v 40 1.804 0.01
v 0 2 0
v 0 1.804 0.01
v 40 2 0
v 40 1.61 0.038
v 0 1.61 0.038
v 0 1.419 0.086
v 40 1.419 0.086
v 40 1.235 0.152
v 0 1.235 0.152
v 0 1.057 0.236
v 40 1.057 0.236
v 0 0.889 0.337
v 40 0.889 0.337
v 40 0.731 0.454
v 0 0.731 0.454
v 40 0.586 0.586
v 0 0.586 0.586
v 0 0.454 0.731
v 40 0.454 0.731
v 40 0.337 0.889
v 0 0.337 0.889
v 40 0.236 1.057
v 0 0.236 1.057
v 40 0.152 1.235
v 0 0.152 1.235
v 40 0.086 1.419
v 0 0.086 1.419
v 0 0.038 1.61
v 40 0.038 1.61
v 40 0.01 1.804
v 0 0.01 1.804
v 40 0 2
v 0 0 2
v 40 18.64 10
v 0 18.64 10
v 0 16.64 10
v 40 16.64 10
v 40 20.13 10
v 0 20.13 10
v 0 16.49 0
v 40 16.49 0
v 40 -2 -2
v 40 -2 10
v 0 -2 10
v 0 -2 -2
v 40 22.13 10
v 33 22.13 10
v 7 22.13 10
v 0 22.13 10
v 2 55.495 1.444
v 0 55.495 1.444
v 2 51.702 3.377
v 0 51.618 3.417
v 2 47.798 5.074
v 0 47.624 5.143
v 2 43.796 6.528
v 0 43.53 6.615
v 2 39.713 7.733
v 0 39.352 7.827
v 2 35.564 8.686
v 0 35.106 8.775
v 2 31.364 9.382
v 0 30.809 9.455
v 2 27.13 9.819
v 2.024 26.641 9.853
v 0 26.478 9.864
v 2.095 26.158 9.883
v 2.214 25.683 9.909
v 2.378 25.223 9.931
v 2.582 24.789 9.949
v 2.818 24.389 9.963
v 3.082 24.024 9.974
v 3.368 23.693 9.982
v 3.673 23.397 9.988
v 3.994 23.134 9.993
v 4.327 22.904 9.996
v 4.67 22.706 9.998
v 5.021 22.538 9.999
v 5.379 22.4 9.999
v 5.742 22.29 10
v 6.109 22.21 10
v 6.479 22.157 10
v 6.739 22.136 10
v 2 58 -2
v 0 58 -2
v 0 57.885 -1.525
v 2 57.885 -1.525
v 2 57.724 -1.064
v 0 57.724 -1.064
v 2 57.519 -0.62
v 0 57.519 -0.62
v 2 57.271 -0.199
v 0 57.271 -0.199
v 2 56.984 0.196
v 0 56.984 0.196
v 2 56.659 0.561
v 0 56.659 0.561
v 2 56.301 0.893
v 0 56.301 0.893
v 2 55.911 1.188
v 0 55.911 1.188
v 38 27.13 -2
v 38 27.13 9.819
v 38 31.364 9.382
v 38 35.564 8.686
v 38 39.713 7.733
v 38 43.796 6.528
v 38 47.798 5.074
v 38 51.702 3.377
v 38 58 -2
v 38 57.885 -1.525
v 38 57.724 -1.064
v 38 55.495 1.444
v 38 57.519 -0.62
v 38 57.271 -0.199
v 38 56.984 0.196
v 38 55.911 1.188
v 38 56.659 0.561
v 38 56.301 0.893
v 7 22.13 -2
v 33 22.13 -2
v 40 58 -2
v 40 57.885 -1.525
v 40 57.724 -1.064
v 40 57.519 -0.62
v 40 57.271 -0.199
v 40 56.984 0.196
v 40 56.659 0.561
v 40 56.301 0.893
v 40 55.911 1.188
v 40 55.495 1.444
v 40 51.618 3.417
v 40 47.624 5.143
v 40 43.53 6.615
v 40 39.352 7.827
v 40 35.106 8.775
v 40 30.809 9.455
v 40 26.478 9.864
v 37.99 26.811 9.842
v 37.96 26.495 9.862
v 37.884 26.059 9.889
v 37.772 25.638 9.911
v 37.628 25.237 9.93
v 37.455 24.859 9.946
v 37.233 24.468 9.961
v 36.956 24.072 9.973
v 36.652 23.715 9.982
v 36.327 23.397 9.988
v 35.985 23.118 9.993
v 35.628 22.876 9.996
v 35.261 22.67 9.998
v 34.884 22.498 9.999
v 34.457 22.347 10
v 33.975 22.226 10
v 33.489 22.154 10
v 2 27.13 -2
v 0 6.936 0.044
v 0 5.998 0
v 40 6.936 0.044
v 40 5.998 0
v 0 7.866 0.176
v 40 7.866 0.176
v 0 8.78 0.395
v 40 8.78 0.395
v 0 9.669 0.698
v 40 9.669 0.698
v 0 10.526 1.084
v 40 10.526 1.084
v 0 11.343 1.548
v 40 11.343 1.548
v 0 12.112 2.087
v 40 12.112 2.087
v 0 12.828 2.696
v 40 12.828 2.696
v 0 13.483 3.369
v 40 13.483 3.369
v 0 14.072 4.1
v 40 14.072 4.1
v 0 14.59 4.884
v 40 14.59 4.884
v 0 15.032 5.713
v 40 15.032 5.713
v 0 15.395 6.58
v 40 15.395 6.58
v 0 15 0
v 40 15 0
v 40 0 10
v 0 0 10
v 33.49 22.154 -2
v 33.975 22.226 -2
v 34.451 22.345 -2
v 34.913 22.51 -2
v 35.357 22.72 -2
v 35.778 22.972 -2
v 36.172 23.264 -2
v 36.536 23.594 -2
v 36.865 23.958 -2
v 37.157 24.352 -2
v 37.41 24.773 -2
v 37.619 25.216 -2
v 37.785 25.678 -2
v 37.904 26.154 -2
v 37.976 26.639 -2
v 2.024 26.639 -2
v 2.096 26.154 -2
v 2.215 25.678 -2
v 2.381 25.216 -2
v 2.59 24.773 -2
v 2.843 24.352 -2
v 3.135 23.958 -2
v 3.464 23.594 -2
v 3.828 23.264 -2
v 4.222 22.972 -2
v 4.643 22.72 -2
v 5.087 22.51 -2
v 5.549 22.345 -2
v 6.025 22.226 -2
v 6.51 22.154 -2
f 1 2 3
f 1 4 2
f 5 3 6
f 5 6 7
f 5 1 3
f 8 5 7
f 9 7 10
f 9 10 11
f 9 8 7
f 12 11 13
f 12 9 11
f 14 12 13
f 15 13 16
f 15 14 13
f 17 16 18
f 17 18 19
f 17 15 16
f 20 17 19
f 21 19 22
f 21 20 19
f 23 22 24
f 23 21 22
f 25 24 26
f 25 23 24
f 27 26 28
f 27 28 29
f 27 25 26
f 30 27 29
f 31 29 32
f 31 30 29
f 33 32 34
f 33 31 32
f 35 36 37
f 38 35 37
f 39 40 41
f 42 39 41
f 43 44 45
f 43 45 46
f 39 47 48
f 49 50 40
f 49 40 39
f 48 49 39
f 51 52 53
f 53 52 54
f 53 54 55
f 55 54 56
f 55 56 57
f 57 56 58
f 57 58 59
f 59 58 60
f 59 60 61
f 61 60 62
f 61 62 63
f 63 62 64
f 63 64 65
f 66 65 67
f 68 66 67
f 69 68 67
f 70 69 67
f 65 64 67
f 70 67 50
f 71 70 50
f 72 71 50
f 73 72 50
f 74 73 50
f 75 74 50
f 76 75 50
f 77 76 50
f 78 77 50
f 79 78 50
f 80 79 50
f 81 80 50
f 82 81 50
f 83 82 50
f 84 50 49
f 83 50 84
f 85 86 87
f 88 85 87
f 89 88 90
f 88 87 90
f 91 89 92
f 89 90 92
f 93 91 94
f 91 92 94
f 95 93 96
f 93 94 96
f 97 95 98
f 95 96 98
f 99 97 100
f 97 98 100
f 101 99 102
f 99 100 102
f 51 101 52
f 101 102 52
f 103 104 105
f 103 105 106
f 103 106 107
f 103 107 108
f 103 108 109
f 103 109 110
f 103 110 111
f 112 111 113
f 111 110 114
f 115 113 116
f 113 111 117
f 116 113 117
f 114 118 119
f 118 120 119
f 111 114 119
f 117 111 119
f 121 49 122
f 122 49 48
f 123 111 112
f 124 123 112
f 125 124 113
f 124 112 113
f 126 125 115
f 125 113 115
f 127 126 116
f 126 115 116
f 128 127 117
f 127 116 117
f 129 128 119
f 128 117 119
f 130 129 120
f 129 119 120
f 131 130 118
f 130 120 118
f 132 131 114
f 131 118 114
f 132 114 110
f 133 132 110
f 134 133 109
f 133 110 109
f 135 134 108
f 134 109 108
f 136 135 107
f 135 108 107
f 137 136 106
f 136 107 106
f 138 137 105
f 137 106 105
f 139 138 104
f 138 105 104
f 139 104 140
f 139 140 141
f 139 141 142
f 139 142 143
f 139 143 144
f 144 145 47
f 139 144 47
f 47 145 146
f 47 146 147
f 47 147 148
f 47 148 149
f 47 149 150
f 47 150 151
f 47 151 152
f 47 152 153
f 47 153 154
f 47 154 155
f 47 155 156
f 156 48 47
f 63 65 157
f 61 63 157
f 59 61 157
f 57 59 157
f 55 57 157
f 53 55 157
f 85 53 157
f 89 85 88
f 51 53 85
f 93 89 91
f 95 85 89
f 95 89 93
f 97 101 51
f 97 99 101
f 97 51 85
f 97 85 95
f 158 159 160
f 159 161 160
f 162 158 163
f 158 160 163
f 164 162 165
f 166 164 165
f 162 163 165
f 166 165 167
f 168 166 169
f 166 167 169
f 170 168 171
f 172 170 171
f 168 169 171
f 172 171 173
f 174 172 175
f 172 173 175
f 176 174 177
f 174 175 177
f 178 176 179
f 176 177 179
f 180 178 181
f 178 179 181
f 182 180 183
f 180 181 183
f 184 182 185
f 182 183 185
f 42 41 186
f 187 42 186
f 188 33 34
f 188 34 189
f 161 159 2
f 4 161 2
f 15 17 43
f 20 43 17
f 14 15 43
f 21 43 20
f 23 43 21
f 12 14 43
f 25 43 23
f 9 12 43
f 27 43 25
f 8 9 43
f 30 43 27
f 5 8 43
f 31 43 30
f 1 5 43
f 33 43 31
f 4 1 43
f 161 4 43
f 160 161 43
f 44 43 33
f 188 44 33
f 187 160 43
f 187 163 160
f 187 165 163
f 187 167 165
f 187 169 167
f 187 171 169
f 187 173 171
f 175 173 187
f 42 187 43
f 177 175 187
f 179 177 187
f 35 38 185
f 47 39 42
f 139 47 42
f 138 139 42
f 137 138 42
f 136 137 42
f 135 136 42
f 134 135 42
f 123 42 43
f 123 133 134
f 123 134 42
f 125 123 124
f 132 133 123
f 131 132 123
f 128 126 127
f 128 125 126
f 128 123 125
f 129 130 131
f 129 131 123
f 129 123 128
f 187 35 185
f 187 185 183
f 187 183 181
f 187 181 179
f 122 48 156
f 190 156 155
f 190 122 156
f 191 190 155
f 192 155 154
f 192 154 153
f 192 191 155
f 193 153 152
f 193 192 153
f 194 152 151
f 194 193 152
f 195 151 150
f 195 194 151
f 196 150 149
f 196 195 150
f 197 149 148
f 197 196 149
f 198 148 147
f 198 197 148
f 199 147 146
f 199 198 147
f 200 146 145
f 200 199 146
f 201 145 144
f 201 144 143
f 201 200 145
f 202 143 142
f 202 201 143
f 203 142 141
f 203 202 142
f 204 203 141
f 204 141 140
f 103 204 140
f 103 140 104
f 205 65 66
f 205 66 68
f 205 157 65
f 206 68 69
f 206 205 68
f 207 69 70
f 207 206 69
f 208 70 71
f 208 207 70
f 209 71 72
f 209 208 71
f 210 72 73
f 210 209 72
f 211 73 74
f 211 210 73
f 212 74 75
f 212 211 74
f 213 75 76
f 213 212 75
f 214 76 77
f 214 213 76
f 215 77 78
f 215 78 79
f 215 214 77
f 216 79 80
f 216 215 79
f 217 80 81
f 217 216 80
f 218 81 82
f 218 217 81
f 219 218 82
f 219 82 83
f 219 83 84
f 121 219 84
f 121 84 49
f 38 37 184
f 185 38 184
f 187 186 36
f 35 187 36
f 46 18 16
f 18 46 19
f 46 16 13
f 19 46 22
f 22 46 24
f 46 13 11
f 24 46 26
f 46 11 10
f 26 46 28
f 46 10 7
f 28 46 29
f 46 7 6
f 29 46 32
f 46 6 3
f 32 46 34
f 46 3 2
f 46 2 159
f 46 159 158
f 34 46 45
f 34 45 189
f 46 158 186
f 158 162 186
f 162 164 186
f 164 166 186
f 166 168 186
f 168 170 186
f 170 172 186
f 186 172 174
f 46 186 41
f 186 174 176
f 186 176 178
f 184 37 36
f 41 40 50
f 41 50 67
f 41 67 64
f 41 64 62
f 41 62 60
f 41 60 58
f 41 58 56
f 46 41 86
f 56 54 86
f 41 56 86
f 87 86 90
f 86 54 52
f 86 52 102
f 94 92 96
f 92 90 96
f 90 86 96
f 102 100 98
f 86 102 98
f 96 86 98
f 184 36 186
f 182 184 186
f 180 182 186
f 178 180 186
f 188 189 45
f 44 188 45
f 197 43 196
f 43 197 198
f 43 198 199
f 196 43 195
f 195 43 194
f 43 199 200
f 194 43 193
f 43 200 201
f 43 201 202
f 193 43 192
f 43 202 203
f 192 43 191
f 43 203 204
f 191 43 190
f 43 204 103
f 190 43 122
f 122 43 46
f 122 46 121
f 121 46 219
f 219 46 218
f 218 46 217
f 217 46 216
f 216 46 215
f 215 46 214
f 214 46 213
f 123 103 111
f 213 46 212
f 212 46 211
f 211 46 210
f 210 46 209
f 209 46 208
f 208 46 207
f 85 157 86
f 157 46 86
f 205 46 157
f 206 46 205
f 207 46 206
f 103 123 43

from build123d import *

# Parameters (mm, degrees)
F1_DEPTH    = 40
F2_R        = 10
F3_R        = 2
F4_W        = 36
F4_H        = 35.8704487759
F5_DEPTH    = 25
F6_R        = 5
F7_T1_DEPTH = 16.4561700335
F7_T3_DEPTH = 16.4561700335


# Not quite as in the source:
# - a fillet or chamfer that OpenCascade refuses, or shapes differently, is made with other operations: its cross-section is extruded or revolved along the edge and cut away or added


with BuildPart() as f1:
    # F0 (on Right) → F1 (new body)
    with BuildSketch(Plane.YZ):
        Polygon((13, 0), (0, 0), (0, 10), (-2, 10), (-2, -2), (58, -2), (58, 0), (22.1295512241, 0), (22.1295512241, 10), (20.1295512241, 10), (16.4898488815, 0), (15, 0), (18.6397023427, 10), (16.6397023427, 10), align=None)
        with BuildLine():
            Line((22.1295512241, 0), (58, 0))
            ThreePointArc((58, 0), (40.7486885255, 7.4532263127), (22.1295512241, 10))
            Line((22.1295512241, 10), (22.1295512241, 0))
        make_face()
    extrude(amount=F1_DEPTH)

    # F2
    f2_edges = [f1.edges().sort_by_distance(p)[0] for p in [
        (20, 13, 0),
    ]]
    fillet(f2_edges, radius=F2_R)

    # F3
    f3_edges = [f1.edges().sort_by_distance(p)[0] for p in [
        (20, 0, 0),
    ]]
    fillet(f3_edges, radius=F3_R)

    # F4 (on face) → F5 (cut)
    with BuildSketch(Plane.XY.offset(10)):
        with Locations((20, 40.0647756121)):
            Rectangle(F4_W, F4_H)
    extrude(amount=-F5_DEPTH, mode=Mode.SUBTRACT)

    # F6
    f6_edges = [f1.edges().sort_by_distance(p)[0] for p in [
        (2, 22.129551, 4),
        (38, 22.129551, 4),
    ]]
    fillet(f6_edges, radius=F6_R)

    # F7: fillet of radius 5 on 2 edges, made by hand

    # F7_s2 → F7_t1 (cut)
    with BuildSketch(Plane.YZ.offset(-7.2280850168)):
        with BuildLine():
            ThreePointArc((58, -2), (57.132526229, 0.0019440058), (55.4951149029, 1.4438783647))
            ThreePointArc((55.4951149029, 1.4438783647), (56.7550844524, 0.7349972576), (58, 0))
            Line((58, 0), (58, -2))
        make_face()
    extrude(amount=F7_T1_DEPTH, mode=Mode.SUBTRACT)

    # F7_s4 → F7_t3 (cut)
    with BuildSketch(Plane.YZ.offset(30.7719149832)):
        with BuildLine():
            ThreePointArc((58, -2), (57.132526229, 0.0019440058), (55.4951149029, 1.4438783647))
            ThreePointArc((55.4951149029, 1.4438783647), (56.7550844524, 0.7349972576), (58, 0))
            Line((58, 0), (58, -2))
        make_face()
    extrude(amount=F7_T3_DEPTH, mode=Mode.SUBTRACT)


solid = f1.part
